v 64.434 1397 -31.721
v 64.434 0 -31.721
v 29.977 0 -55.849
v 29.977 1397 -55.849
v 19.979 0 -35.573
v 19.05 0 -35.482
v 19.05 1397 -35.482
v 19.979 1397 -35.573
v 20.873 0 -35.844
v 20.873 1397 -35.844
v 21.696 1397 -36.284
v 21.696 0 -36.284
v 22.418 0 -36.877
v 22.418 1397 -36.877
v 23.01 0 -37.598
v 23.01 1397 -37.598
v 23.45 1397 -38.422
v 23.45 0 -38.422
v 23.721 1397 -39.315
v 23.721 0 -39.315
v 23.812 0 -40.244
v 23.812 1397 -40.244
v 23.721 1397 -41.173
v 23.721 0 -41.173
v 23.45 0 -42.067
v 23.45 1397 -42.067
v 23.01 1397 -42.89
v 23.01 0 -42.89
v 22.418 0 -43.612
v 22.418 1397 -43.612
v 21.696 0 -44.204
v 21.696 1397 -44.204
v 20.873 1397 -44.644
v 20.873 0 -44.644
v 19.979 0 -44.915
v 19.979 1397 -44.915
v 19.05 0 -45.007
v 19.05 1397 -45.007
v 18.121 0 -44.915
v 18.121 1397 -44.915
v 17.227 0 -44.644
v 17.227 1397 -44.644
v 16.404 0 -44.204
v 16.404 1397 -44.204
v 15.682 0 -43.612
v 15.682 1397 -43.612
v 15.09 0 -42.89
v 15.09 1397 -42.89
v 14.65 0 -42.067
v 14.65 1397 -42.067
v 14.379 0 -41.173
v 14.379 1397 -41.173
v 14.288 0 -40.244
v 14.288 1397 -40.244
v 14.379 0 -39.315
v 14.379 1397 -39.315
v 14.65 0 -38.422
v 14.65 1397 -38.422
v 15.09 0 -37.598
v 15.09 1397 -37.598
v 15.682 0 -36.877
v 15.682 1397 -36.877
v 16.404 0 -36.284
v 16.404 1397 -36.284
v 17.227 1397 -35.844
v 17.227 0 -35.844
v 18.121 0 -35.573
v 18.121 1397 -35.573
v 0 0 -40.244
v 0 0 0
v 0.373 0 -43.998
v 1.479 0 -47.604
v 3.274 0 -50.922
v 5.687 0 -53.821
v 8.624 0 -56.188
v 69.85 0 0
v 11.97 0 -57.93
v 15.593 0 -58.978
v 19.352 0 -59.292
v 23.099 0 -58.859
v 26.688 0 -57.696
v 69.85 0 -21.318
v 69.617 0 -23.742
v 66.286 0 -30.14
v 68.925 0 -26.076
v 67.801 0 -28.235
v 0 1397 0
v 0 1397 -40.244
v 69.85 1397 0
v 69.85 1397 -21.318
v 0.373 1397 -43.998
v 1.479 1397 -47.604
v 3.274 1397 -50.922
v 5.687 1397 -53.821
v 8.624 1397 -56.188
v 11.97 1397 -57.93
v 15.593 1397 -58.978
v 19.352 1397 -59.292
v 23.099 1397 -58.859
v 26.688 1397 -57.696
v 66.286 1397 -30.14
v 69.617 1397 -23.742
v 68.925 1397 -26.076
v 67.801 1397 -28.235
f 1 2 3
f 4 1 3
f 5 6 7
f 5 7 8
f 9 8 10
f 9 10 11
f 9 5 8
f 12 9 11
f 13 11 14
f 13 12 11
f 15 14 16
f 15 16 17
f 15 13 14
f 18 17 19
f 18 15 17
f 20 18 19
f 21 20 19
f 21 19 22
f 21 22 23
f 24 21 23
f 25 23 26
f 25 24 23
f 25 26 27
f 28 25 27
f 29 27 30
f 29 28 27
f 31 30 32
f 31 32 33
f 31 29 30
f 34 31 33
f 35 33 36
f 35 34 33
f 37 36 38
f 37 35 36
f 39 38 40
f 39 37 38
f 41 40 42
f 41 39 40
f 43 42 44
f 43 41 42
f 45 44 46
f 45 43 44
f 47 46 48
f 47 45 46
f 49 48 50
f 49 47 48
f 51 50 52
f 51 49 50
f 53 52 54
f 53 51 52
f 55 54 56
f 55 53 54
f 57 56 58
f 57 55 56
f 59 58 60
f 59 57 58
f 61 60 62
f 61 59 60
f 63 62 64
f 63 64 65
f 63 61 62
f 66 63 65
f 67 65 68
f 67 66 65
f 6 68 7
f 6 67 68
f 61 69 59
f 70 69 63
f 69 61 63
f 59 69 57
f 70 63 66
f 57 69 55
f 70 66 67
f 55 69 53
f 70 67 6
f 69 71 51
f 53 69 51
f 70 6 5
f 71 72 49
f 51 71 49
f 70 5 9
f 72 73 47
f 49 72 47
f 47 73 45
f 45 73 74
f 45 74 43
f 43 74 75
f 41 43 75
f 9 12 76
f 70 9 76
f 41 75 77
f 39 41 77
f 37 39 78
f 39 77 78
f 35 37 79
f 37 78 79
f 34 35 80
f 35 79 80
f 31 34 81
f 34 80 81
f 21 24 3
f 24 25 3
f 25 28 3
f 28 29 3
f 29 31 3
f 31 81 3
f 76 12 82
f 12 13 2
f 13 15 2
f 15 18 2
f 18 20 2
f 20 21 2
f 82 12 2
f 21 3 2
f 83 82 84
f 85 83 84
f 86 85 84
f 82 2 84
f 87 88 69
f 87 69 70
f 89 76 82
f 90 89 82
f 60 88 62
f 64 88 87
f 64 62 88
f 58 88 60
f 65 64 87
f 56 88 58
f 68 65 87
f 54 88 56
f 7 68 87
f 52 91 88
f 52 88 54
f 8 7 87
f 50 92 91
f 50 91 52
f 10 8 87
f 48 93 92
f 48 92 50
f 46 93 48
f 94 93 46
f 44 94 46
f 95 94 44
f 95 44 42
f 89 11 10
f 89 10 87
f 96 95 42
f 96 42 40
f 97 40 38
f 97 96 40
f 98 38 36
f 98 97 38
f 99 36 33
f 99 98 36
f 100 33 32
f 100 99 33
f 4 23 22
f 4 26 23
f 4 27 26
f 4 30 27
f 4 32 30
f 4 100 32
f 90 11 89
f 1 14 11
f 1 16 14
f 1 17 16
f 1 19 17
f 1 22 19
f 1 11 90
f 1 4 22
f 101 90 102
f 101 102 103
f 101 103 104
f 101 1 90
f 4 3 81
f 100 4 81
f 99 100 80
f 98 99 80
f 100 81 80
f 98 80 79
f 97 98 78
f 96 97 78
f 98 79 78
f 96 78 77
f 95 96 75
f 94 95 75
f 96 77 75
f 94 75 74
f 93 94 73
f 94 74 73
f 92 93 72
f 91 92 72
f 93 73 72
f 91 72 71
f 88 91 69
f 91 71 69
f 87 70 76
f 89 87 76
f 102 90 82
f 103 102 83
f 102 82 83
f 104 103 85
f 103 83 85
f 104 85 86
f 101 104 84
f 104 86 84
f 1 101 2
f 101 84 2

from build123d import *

# Parameters (mm, degrees)
SKETCH1_R           = 4.7625
BOSS_EXTRUDE1_DEPTH = 1397


with BuildPart() as part:
    # Sketch1 → Boss-Extrude1 (new body)
    with BuildSketch(Plane(origin=(0, 0, 0), x_dir=(1, 0, 0), z_dir=(0, 1, 0))):
        with BuildLine():
            ThreePointArc((29.976631112, 55.849090528), (10.253688918, 57.141800456), (0, 40.244244084))
            Line((0, 40.244244084), (0, 0))
            Line((0, 0), (69.85, 0))
            Line((69.85, 0), (69.85, 21.318255517))
            ThreePointArc((69.85, 21.318255517), (68.415037581, 27.182462905), (64.434420742, 31.721486479))
            Line((64.434420742, 31.721486479), (29.976631112, 55.849090528))
        make_face()
        with Locations(Location((19.05, 40.244244084, 0), (0, 0, 270))):
            Circle(SKETCH1_R, mode=Mode.SUBTRACT)
    extrude(amount=BOSS_EXTRUDE1_DEPTH)


solid = part.part
